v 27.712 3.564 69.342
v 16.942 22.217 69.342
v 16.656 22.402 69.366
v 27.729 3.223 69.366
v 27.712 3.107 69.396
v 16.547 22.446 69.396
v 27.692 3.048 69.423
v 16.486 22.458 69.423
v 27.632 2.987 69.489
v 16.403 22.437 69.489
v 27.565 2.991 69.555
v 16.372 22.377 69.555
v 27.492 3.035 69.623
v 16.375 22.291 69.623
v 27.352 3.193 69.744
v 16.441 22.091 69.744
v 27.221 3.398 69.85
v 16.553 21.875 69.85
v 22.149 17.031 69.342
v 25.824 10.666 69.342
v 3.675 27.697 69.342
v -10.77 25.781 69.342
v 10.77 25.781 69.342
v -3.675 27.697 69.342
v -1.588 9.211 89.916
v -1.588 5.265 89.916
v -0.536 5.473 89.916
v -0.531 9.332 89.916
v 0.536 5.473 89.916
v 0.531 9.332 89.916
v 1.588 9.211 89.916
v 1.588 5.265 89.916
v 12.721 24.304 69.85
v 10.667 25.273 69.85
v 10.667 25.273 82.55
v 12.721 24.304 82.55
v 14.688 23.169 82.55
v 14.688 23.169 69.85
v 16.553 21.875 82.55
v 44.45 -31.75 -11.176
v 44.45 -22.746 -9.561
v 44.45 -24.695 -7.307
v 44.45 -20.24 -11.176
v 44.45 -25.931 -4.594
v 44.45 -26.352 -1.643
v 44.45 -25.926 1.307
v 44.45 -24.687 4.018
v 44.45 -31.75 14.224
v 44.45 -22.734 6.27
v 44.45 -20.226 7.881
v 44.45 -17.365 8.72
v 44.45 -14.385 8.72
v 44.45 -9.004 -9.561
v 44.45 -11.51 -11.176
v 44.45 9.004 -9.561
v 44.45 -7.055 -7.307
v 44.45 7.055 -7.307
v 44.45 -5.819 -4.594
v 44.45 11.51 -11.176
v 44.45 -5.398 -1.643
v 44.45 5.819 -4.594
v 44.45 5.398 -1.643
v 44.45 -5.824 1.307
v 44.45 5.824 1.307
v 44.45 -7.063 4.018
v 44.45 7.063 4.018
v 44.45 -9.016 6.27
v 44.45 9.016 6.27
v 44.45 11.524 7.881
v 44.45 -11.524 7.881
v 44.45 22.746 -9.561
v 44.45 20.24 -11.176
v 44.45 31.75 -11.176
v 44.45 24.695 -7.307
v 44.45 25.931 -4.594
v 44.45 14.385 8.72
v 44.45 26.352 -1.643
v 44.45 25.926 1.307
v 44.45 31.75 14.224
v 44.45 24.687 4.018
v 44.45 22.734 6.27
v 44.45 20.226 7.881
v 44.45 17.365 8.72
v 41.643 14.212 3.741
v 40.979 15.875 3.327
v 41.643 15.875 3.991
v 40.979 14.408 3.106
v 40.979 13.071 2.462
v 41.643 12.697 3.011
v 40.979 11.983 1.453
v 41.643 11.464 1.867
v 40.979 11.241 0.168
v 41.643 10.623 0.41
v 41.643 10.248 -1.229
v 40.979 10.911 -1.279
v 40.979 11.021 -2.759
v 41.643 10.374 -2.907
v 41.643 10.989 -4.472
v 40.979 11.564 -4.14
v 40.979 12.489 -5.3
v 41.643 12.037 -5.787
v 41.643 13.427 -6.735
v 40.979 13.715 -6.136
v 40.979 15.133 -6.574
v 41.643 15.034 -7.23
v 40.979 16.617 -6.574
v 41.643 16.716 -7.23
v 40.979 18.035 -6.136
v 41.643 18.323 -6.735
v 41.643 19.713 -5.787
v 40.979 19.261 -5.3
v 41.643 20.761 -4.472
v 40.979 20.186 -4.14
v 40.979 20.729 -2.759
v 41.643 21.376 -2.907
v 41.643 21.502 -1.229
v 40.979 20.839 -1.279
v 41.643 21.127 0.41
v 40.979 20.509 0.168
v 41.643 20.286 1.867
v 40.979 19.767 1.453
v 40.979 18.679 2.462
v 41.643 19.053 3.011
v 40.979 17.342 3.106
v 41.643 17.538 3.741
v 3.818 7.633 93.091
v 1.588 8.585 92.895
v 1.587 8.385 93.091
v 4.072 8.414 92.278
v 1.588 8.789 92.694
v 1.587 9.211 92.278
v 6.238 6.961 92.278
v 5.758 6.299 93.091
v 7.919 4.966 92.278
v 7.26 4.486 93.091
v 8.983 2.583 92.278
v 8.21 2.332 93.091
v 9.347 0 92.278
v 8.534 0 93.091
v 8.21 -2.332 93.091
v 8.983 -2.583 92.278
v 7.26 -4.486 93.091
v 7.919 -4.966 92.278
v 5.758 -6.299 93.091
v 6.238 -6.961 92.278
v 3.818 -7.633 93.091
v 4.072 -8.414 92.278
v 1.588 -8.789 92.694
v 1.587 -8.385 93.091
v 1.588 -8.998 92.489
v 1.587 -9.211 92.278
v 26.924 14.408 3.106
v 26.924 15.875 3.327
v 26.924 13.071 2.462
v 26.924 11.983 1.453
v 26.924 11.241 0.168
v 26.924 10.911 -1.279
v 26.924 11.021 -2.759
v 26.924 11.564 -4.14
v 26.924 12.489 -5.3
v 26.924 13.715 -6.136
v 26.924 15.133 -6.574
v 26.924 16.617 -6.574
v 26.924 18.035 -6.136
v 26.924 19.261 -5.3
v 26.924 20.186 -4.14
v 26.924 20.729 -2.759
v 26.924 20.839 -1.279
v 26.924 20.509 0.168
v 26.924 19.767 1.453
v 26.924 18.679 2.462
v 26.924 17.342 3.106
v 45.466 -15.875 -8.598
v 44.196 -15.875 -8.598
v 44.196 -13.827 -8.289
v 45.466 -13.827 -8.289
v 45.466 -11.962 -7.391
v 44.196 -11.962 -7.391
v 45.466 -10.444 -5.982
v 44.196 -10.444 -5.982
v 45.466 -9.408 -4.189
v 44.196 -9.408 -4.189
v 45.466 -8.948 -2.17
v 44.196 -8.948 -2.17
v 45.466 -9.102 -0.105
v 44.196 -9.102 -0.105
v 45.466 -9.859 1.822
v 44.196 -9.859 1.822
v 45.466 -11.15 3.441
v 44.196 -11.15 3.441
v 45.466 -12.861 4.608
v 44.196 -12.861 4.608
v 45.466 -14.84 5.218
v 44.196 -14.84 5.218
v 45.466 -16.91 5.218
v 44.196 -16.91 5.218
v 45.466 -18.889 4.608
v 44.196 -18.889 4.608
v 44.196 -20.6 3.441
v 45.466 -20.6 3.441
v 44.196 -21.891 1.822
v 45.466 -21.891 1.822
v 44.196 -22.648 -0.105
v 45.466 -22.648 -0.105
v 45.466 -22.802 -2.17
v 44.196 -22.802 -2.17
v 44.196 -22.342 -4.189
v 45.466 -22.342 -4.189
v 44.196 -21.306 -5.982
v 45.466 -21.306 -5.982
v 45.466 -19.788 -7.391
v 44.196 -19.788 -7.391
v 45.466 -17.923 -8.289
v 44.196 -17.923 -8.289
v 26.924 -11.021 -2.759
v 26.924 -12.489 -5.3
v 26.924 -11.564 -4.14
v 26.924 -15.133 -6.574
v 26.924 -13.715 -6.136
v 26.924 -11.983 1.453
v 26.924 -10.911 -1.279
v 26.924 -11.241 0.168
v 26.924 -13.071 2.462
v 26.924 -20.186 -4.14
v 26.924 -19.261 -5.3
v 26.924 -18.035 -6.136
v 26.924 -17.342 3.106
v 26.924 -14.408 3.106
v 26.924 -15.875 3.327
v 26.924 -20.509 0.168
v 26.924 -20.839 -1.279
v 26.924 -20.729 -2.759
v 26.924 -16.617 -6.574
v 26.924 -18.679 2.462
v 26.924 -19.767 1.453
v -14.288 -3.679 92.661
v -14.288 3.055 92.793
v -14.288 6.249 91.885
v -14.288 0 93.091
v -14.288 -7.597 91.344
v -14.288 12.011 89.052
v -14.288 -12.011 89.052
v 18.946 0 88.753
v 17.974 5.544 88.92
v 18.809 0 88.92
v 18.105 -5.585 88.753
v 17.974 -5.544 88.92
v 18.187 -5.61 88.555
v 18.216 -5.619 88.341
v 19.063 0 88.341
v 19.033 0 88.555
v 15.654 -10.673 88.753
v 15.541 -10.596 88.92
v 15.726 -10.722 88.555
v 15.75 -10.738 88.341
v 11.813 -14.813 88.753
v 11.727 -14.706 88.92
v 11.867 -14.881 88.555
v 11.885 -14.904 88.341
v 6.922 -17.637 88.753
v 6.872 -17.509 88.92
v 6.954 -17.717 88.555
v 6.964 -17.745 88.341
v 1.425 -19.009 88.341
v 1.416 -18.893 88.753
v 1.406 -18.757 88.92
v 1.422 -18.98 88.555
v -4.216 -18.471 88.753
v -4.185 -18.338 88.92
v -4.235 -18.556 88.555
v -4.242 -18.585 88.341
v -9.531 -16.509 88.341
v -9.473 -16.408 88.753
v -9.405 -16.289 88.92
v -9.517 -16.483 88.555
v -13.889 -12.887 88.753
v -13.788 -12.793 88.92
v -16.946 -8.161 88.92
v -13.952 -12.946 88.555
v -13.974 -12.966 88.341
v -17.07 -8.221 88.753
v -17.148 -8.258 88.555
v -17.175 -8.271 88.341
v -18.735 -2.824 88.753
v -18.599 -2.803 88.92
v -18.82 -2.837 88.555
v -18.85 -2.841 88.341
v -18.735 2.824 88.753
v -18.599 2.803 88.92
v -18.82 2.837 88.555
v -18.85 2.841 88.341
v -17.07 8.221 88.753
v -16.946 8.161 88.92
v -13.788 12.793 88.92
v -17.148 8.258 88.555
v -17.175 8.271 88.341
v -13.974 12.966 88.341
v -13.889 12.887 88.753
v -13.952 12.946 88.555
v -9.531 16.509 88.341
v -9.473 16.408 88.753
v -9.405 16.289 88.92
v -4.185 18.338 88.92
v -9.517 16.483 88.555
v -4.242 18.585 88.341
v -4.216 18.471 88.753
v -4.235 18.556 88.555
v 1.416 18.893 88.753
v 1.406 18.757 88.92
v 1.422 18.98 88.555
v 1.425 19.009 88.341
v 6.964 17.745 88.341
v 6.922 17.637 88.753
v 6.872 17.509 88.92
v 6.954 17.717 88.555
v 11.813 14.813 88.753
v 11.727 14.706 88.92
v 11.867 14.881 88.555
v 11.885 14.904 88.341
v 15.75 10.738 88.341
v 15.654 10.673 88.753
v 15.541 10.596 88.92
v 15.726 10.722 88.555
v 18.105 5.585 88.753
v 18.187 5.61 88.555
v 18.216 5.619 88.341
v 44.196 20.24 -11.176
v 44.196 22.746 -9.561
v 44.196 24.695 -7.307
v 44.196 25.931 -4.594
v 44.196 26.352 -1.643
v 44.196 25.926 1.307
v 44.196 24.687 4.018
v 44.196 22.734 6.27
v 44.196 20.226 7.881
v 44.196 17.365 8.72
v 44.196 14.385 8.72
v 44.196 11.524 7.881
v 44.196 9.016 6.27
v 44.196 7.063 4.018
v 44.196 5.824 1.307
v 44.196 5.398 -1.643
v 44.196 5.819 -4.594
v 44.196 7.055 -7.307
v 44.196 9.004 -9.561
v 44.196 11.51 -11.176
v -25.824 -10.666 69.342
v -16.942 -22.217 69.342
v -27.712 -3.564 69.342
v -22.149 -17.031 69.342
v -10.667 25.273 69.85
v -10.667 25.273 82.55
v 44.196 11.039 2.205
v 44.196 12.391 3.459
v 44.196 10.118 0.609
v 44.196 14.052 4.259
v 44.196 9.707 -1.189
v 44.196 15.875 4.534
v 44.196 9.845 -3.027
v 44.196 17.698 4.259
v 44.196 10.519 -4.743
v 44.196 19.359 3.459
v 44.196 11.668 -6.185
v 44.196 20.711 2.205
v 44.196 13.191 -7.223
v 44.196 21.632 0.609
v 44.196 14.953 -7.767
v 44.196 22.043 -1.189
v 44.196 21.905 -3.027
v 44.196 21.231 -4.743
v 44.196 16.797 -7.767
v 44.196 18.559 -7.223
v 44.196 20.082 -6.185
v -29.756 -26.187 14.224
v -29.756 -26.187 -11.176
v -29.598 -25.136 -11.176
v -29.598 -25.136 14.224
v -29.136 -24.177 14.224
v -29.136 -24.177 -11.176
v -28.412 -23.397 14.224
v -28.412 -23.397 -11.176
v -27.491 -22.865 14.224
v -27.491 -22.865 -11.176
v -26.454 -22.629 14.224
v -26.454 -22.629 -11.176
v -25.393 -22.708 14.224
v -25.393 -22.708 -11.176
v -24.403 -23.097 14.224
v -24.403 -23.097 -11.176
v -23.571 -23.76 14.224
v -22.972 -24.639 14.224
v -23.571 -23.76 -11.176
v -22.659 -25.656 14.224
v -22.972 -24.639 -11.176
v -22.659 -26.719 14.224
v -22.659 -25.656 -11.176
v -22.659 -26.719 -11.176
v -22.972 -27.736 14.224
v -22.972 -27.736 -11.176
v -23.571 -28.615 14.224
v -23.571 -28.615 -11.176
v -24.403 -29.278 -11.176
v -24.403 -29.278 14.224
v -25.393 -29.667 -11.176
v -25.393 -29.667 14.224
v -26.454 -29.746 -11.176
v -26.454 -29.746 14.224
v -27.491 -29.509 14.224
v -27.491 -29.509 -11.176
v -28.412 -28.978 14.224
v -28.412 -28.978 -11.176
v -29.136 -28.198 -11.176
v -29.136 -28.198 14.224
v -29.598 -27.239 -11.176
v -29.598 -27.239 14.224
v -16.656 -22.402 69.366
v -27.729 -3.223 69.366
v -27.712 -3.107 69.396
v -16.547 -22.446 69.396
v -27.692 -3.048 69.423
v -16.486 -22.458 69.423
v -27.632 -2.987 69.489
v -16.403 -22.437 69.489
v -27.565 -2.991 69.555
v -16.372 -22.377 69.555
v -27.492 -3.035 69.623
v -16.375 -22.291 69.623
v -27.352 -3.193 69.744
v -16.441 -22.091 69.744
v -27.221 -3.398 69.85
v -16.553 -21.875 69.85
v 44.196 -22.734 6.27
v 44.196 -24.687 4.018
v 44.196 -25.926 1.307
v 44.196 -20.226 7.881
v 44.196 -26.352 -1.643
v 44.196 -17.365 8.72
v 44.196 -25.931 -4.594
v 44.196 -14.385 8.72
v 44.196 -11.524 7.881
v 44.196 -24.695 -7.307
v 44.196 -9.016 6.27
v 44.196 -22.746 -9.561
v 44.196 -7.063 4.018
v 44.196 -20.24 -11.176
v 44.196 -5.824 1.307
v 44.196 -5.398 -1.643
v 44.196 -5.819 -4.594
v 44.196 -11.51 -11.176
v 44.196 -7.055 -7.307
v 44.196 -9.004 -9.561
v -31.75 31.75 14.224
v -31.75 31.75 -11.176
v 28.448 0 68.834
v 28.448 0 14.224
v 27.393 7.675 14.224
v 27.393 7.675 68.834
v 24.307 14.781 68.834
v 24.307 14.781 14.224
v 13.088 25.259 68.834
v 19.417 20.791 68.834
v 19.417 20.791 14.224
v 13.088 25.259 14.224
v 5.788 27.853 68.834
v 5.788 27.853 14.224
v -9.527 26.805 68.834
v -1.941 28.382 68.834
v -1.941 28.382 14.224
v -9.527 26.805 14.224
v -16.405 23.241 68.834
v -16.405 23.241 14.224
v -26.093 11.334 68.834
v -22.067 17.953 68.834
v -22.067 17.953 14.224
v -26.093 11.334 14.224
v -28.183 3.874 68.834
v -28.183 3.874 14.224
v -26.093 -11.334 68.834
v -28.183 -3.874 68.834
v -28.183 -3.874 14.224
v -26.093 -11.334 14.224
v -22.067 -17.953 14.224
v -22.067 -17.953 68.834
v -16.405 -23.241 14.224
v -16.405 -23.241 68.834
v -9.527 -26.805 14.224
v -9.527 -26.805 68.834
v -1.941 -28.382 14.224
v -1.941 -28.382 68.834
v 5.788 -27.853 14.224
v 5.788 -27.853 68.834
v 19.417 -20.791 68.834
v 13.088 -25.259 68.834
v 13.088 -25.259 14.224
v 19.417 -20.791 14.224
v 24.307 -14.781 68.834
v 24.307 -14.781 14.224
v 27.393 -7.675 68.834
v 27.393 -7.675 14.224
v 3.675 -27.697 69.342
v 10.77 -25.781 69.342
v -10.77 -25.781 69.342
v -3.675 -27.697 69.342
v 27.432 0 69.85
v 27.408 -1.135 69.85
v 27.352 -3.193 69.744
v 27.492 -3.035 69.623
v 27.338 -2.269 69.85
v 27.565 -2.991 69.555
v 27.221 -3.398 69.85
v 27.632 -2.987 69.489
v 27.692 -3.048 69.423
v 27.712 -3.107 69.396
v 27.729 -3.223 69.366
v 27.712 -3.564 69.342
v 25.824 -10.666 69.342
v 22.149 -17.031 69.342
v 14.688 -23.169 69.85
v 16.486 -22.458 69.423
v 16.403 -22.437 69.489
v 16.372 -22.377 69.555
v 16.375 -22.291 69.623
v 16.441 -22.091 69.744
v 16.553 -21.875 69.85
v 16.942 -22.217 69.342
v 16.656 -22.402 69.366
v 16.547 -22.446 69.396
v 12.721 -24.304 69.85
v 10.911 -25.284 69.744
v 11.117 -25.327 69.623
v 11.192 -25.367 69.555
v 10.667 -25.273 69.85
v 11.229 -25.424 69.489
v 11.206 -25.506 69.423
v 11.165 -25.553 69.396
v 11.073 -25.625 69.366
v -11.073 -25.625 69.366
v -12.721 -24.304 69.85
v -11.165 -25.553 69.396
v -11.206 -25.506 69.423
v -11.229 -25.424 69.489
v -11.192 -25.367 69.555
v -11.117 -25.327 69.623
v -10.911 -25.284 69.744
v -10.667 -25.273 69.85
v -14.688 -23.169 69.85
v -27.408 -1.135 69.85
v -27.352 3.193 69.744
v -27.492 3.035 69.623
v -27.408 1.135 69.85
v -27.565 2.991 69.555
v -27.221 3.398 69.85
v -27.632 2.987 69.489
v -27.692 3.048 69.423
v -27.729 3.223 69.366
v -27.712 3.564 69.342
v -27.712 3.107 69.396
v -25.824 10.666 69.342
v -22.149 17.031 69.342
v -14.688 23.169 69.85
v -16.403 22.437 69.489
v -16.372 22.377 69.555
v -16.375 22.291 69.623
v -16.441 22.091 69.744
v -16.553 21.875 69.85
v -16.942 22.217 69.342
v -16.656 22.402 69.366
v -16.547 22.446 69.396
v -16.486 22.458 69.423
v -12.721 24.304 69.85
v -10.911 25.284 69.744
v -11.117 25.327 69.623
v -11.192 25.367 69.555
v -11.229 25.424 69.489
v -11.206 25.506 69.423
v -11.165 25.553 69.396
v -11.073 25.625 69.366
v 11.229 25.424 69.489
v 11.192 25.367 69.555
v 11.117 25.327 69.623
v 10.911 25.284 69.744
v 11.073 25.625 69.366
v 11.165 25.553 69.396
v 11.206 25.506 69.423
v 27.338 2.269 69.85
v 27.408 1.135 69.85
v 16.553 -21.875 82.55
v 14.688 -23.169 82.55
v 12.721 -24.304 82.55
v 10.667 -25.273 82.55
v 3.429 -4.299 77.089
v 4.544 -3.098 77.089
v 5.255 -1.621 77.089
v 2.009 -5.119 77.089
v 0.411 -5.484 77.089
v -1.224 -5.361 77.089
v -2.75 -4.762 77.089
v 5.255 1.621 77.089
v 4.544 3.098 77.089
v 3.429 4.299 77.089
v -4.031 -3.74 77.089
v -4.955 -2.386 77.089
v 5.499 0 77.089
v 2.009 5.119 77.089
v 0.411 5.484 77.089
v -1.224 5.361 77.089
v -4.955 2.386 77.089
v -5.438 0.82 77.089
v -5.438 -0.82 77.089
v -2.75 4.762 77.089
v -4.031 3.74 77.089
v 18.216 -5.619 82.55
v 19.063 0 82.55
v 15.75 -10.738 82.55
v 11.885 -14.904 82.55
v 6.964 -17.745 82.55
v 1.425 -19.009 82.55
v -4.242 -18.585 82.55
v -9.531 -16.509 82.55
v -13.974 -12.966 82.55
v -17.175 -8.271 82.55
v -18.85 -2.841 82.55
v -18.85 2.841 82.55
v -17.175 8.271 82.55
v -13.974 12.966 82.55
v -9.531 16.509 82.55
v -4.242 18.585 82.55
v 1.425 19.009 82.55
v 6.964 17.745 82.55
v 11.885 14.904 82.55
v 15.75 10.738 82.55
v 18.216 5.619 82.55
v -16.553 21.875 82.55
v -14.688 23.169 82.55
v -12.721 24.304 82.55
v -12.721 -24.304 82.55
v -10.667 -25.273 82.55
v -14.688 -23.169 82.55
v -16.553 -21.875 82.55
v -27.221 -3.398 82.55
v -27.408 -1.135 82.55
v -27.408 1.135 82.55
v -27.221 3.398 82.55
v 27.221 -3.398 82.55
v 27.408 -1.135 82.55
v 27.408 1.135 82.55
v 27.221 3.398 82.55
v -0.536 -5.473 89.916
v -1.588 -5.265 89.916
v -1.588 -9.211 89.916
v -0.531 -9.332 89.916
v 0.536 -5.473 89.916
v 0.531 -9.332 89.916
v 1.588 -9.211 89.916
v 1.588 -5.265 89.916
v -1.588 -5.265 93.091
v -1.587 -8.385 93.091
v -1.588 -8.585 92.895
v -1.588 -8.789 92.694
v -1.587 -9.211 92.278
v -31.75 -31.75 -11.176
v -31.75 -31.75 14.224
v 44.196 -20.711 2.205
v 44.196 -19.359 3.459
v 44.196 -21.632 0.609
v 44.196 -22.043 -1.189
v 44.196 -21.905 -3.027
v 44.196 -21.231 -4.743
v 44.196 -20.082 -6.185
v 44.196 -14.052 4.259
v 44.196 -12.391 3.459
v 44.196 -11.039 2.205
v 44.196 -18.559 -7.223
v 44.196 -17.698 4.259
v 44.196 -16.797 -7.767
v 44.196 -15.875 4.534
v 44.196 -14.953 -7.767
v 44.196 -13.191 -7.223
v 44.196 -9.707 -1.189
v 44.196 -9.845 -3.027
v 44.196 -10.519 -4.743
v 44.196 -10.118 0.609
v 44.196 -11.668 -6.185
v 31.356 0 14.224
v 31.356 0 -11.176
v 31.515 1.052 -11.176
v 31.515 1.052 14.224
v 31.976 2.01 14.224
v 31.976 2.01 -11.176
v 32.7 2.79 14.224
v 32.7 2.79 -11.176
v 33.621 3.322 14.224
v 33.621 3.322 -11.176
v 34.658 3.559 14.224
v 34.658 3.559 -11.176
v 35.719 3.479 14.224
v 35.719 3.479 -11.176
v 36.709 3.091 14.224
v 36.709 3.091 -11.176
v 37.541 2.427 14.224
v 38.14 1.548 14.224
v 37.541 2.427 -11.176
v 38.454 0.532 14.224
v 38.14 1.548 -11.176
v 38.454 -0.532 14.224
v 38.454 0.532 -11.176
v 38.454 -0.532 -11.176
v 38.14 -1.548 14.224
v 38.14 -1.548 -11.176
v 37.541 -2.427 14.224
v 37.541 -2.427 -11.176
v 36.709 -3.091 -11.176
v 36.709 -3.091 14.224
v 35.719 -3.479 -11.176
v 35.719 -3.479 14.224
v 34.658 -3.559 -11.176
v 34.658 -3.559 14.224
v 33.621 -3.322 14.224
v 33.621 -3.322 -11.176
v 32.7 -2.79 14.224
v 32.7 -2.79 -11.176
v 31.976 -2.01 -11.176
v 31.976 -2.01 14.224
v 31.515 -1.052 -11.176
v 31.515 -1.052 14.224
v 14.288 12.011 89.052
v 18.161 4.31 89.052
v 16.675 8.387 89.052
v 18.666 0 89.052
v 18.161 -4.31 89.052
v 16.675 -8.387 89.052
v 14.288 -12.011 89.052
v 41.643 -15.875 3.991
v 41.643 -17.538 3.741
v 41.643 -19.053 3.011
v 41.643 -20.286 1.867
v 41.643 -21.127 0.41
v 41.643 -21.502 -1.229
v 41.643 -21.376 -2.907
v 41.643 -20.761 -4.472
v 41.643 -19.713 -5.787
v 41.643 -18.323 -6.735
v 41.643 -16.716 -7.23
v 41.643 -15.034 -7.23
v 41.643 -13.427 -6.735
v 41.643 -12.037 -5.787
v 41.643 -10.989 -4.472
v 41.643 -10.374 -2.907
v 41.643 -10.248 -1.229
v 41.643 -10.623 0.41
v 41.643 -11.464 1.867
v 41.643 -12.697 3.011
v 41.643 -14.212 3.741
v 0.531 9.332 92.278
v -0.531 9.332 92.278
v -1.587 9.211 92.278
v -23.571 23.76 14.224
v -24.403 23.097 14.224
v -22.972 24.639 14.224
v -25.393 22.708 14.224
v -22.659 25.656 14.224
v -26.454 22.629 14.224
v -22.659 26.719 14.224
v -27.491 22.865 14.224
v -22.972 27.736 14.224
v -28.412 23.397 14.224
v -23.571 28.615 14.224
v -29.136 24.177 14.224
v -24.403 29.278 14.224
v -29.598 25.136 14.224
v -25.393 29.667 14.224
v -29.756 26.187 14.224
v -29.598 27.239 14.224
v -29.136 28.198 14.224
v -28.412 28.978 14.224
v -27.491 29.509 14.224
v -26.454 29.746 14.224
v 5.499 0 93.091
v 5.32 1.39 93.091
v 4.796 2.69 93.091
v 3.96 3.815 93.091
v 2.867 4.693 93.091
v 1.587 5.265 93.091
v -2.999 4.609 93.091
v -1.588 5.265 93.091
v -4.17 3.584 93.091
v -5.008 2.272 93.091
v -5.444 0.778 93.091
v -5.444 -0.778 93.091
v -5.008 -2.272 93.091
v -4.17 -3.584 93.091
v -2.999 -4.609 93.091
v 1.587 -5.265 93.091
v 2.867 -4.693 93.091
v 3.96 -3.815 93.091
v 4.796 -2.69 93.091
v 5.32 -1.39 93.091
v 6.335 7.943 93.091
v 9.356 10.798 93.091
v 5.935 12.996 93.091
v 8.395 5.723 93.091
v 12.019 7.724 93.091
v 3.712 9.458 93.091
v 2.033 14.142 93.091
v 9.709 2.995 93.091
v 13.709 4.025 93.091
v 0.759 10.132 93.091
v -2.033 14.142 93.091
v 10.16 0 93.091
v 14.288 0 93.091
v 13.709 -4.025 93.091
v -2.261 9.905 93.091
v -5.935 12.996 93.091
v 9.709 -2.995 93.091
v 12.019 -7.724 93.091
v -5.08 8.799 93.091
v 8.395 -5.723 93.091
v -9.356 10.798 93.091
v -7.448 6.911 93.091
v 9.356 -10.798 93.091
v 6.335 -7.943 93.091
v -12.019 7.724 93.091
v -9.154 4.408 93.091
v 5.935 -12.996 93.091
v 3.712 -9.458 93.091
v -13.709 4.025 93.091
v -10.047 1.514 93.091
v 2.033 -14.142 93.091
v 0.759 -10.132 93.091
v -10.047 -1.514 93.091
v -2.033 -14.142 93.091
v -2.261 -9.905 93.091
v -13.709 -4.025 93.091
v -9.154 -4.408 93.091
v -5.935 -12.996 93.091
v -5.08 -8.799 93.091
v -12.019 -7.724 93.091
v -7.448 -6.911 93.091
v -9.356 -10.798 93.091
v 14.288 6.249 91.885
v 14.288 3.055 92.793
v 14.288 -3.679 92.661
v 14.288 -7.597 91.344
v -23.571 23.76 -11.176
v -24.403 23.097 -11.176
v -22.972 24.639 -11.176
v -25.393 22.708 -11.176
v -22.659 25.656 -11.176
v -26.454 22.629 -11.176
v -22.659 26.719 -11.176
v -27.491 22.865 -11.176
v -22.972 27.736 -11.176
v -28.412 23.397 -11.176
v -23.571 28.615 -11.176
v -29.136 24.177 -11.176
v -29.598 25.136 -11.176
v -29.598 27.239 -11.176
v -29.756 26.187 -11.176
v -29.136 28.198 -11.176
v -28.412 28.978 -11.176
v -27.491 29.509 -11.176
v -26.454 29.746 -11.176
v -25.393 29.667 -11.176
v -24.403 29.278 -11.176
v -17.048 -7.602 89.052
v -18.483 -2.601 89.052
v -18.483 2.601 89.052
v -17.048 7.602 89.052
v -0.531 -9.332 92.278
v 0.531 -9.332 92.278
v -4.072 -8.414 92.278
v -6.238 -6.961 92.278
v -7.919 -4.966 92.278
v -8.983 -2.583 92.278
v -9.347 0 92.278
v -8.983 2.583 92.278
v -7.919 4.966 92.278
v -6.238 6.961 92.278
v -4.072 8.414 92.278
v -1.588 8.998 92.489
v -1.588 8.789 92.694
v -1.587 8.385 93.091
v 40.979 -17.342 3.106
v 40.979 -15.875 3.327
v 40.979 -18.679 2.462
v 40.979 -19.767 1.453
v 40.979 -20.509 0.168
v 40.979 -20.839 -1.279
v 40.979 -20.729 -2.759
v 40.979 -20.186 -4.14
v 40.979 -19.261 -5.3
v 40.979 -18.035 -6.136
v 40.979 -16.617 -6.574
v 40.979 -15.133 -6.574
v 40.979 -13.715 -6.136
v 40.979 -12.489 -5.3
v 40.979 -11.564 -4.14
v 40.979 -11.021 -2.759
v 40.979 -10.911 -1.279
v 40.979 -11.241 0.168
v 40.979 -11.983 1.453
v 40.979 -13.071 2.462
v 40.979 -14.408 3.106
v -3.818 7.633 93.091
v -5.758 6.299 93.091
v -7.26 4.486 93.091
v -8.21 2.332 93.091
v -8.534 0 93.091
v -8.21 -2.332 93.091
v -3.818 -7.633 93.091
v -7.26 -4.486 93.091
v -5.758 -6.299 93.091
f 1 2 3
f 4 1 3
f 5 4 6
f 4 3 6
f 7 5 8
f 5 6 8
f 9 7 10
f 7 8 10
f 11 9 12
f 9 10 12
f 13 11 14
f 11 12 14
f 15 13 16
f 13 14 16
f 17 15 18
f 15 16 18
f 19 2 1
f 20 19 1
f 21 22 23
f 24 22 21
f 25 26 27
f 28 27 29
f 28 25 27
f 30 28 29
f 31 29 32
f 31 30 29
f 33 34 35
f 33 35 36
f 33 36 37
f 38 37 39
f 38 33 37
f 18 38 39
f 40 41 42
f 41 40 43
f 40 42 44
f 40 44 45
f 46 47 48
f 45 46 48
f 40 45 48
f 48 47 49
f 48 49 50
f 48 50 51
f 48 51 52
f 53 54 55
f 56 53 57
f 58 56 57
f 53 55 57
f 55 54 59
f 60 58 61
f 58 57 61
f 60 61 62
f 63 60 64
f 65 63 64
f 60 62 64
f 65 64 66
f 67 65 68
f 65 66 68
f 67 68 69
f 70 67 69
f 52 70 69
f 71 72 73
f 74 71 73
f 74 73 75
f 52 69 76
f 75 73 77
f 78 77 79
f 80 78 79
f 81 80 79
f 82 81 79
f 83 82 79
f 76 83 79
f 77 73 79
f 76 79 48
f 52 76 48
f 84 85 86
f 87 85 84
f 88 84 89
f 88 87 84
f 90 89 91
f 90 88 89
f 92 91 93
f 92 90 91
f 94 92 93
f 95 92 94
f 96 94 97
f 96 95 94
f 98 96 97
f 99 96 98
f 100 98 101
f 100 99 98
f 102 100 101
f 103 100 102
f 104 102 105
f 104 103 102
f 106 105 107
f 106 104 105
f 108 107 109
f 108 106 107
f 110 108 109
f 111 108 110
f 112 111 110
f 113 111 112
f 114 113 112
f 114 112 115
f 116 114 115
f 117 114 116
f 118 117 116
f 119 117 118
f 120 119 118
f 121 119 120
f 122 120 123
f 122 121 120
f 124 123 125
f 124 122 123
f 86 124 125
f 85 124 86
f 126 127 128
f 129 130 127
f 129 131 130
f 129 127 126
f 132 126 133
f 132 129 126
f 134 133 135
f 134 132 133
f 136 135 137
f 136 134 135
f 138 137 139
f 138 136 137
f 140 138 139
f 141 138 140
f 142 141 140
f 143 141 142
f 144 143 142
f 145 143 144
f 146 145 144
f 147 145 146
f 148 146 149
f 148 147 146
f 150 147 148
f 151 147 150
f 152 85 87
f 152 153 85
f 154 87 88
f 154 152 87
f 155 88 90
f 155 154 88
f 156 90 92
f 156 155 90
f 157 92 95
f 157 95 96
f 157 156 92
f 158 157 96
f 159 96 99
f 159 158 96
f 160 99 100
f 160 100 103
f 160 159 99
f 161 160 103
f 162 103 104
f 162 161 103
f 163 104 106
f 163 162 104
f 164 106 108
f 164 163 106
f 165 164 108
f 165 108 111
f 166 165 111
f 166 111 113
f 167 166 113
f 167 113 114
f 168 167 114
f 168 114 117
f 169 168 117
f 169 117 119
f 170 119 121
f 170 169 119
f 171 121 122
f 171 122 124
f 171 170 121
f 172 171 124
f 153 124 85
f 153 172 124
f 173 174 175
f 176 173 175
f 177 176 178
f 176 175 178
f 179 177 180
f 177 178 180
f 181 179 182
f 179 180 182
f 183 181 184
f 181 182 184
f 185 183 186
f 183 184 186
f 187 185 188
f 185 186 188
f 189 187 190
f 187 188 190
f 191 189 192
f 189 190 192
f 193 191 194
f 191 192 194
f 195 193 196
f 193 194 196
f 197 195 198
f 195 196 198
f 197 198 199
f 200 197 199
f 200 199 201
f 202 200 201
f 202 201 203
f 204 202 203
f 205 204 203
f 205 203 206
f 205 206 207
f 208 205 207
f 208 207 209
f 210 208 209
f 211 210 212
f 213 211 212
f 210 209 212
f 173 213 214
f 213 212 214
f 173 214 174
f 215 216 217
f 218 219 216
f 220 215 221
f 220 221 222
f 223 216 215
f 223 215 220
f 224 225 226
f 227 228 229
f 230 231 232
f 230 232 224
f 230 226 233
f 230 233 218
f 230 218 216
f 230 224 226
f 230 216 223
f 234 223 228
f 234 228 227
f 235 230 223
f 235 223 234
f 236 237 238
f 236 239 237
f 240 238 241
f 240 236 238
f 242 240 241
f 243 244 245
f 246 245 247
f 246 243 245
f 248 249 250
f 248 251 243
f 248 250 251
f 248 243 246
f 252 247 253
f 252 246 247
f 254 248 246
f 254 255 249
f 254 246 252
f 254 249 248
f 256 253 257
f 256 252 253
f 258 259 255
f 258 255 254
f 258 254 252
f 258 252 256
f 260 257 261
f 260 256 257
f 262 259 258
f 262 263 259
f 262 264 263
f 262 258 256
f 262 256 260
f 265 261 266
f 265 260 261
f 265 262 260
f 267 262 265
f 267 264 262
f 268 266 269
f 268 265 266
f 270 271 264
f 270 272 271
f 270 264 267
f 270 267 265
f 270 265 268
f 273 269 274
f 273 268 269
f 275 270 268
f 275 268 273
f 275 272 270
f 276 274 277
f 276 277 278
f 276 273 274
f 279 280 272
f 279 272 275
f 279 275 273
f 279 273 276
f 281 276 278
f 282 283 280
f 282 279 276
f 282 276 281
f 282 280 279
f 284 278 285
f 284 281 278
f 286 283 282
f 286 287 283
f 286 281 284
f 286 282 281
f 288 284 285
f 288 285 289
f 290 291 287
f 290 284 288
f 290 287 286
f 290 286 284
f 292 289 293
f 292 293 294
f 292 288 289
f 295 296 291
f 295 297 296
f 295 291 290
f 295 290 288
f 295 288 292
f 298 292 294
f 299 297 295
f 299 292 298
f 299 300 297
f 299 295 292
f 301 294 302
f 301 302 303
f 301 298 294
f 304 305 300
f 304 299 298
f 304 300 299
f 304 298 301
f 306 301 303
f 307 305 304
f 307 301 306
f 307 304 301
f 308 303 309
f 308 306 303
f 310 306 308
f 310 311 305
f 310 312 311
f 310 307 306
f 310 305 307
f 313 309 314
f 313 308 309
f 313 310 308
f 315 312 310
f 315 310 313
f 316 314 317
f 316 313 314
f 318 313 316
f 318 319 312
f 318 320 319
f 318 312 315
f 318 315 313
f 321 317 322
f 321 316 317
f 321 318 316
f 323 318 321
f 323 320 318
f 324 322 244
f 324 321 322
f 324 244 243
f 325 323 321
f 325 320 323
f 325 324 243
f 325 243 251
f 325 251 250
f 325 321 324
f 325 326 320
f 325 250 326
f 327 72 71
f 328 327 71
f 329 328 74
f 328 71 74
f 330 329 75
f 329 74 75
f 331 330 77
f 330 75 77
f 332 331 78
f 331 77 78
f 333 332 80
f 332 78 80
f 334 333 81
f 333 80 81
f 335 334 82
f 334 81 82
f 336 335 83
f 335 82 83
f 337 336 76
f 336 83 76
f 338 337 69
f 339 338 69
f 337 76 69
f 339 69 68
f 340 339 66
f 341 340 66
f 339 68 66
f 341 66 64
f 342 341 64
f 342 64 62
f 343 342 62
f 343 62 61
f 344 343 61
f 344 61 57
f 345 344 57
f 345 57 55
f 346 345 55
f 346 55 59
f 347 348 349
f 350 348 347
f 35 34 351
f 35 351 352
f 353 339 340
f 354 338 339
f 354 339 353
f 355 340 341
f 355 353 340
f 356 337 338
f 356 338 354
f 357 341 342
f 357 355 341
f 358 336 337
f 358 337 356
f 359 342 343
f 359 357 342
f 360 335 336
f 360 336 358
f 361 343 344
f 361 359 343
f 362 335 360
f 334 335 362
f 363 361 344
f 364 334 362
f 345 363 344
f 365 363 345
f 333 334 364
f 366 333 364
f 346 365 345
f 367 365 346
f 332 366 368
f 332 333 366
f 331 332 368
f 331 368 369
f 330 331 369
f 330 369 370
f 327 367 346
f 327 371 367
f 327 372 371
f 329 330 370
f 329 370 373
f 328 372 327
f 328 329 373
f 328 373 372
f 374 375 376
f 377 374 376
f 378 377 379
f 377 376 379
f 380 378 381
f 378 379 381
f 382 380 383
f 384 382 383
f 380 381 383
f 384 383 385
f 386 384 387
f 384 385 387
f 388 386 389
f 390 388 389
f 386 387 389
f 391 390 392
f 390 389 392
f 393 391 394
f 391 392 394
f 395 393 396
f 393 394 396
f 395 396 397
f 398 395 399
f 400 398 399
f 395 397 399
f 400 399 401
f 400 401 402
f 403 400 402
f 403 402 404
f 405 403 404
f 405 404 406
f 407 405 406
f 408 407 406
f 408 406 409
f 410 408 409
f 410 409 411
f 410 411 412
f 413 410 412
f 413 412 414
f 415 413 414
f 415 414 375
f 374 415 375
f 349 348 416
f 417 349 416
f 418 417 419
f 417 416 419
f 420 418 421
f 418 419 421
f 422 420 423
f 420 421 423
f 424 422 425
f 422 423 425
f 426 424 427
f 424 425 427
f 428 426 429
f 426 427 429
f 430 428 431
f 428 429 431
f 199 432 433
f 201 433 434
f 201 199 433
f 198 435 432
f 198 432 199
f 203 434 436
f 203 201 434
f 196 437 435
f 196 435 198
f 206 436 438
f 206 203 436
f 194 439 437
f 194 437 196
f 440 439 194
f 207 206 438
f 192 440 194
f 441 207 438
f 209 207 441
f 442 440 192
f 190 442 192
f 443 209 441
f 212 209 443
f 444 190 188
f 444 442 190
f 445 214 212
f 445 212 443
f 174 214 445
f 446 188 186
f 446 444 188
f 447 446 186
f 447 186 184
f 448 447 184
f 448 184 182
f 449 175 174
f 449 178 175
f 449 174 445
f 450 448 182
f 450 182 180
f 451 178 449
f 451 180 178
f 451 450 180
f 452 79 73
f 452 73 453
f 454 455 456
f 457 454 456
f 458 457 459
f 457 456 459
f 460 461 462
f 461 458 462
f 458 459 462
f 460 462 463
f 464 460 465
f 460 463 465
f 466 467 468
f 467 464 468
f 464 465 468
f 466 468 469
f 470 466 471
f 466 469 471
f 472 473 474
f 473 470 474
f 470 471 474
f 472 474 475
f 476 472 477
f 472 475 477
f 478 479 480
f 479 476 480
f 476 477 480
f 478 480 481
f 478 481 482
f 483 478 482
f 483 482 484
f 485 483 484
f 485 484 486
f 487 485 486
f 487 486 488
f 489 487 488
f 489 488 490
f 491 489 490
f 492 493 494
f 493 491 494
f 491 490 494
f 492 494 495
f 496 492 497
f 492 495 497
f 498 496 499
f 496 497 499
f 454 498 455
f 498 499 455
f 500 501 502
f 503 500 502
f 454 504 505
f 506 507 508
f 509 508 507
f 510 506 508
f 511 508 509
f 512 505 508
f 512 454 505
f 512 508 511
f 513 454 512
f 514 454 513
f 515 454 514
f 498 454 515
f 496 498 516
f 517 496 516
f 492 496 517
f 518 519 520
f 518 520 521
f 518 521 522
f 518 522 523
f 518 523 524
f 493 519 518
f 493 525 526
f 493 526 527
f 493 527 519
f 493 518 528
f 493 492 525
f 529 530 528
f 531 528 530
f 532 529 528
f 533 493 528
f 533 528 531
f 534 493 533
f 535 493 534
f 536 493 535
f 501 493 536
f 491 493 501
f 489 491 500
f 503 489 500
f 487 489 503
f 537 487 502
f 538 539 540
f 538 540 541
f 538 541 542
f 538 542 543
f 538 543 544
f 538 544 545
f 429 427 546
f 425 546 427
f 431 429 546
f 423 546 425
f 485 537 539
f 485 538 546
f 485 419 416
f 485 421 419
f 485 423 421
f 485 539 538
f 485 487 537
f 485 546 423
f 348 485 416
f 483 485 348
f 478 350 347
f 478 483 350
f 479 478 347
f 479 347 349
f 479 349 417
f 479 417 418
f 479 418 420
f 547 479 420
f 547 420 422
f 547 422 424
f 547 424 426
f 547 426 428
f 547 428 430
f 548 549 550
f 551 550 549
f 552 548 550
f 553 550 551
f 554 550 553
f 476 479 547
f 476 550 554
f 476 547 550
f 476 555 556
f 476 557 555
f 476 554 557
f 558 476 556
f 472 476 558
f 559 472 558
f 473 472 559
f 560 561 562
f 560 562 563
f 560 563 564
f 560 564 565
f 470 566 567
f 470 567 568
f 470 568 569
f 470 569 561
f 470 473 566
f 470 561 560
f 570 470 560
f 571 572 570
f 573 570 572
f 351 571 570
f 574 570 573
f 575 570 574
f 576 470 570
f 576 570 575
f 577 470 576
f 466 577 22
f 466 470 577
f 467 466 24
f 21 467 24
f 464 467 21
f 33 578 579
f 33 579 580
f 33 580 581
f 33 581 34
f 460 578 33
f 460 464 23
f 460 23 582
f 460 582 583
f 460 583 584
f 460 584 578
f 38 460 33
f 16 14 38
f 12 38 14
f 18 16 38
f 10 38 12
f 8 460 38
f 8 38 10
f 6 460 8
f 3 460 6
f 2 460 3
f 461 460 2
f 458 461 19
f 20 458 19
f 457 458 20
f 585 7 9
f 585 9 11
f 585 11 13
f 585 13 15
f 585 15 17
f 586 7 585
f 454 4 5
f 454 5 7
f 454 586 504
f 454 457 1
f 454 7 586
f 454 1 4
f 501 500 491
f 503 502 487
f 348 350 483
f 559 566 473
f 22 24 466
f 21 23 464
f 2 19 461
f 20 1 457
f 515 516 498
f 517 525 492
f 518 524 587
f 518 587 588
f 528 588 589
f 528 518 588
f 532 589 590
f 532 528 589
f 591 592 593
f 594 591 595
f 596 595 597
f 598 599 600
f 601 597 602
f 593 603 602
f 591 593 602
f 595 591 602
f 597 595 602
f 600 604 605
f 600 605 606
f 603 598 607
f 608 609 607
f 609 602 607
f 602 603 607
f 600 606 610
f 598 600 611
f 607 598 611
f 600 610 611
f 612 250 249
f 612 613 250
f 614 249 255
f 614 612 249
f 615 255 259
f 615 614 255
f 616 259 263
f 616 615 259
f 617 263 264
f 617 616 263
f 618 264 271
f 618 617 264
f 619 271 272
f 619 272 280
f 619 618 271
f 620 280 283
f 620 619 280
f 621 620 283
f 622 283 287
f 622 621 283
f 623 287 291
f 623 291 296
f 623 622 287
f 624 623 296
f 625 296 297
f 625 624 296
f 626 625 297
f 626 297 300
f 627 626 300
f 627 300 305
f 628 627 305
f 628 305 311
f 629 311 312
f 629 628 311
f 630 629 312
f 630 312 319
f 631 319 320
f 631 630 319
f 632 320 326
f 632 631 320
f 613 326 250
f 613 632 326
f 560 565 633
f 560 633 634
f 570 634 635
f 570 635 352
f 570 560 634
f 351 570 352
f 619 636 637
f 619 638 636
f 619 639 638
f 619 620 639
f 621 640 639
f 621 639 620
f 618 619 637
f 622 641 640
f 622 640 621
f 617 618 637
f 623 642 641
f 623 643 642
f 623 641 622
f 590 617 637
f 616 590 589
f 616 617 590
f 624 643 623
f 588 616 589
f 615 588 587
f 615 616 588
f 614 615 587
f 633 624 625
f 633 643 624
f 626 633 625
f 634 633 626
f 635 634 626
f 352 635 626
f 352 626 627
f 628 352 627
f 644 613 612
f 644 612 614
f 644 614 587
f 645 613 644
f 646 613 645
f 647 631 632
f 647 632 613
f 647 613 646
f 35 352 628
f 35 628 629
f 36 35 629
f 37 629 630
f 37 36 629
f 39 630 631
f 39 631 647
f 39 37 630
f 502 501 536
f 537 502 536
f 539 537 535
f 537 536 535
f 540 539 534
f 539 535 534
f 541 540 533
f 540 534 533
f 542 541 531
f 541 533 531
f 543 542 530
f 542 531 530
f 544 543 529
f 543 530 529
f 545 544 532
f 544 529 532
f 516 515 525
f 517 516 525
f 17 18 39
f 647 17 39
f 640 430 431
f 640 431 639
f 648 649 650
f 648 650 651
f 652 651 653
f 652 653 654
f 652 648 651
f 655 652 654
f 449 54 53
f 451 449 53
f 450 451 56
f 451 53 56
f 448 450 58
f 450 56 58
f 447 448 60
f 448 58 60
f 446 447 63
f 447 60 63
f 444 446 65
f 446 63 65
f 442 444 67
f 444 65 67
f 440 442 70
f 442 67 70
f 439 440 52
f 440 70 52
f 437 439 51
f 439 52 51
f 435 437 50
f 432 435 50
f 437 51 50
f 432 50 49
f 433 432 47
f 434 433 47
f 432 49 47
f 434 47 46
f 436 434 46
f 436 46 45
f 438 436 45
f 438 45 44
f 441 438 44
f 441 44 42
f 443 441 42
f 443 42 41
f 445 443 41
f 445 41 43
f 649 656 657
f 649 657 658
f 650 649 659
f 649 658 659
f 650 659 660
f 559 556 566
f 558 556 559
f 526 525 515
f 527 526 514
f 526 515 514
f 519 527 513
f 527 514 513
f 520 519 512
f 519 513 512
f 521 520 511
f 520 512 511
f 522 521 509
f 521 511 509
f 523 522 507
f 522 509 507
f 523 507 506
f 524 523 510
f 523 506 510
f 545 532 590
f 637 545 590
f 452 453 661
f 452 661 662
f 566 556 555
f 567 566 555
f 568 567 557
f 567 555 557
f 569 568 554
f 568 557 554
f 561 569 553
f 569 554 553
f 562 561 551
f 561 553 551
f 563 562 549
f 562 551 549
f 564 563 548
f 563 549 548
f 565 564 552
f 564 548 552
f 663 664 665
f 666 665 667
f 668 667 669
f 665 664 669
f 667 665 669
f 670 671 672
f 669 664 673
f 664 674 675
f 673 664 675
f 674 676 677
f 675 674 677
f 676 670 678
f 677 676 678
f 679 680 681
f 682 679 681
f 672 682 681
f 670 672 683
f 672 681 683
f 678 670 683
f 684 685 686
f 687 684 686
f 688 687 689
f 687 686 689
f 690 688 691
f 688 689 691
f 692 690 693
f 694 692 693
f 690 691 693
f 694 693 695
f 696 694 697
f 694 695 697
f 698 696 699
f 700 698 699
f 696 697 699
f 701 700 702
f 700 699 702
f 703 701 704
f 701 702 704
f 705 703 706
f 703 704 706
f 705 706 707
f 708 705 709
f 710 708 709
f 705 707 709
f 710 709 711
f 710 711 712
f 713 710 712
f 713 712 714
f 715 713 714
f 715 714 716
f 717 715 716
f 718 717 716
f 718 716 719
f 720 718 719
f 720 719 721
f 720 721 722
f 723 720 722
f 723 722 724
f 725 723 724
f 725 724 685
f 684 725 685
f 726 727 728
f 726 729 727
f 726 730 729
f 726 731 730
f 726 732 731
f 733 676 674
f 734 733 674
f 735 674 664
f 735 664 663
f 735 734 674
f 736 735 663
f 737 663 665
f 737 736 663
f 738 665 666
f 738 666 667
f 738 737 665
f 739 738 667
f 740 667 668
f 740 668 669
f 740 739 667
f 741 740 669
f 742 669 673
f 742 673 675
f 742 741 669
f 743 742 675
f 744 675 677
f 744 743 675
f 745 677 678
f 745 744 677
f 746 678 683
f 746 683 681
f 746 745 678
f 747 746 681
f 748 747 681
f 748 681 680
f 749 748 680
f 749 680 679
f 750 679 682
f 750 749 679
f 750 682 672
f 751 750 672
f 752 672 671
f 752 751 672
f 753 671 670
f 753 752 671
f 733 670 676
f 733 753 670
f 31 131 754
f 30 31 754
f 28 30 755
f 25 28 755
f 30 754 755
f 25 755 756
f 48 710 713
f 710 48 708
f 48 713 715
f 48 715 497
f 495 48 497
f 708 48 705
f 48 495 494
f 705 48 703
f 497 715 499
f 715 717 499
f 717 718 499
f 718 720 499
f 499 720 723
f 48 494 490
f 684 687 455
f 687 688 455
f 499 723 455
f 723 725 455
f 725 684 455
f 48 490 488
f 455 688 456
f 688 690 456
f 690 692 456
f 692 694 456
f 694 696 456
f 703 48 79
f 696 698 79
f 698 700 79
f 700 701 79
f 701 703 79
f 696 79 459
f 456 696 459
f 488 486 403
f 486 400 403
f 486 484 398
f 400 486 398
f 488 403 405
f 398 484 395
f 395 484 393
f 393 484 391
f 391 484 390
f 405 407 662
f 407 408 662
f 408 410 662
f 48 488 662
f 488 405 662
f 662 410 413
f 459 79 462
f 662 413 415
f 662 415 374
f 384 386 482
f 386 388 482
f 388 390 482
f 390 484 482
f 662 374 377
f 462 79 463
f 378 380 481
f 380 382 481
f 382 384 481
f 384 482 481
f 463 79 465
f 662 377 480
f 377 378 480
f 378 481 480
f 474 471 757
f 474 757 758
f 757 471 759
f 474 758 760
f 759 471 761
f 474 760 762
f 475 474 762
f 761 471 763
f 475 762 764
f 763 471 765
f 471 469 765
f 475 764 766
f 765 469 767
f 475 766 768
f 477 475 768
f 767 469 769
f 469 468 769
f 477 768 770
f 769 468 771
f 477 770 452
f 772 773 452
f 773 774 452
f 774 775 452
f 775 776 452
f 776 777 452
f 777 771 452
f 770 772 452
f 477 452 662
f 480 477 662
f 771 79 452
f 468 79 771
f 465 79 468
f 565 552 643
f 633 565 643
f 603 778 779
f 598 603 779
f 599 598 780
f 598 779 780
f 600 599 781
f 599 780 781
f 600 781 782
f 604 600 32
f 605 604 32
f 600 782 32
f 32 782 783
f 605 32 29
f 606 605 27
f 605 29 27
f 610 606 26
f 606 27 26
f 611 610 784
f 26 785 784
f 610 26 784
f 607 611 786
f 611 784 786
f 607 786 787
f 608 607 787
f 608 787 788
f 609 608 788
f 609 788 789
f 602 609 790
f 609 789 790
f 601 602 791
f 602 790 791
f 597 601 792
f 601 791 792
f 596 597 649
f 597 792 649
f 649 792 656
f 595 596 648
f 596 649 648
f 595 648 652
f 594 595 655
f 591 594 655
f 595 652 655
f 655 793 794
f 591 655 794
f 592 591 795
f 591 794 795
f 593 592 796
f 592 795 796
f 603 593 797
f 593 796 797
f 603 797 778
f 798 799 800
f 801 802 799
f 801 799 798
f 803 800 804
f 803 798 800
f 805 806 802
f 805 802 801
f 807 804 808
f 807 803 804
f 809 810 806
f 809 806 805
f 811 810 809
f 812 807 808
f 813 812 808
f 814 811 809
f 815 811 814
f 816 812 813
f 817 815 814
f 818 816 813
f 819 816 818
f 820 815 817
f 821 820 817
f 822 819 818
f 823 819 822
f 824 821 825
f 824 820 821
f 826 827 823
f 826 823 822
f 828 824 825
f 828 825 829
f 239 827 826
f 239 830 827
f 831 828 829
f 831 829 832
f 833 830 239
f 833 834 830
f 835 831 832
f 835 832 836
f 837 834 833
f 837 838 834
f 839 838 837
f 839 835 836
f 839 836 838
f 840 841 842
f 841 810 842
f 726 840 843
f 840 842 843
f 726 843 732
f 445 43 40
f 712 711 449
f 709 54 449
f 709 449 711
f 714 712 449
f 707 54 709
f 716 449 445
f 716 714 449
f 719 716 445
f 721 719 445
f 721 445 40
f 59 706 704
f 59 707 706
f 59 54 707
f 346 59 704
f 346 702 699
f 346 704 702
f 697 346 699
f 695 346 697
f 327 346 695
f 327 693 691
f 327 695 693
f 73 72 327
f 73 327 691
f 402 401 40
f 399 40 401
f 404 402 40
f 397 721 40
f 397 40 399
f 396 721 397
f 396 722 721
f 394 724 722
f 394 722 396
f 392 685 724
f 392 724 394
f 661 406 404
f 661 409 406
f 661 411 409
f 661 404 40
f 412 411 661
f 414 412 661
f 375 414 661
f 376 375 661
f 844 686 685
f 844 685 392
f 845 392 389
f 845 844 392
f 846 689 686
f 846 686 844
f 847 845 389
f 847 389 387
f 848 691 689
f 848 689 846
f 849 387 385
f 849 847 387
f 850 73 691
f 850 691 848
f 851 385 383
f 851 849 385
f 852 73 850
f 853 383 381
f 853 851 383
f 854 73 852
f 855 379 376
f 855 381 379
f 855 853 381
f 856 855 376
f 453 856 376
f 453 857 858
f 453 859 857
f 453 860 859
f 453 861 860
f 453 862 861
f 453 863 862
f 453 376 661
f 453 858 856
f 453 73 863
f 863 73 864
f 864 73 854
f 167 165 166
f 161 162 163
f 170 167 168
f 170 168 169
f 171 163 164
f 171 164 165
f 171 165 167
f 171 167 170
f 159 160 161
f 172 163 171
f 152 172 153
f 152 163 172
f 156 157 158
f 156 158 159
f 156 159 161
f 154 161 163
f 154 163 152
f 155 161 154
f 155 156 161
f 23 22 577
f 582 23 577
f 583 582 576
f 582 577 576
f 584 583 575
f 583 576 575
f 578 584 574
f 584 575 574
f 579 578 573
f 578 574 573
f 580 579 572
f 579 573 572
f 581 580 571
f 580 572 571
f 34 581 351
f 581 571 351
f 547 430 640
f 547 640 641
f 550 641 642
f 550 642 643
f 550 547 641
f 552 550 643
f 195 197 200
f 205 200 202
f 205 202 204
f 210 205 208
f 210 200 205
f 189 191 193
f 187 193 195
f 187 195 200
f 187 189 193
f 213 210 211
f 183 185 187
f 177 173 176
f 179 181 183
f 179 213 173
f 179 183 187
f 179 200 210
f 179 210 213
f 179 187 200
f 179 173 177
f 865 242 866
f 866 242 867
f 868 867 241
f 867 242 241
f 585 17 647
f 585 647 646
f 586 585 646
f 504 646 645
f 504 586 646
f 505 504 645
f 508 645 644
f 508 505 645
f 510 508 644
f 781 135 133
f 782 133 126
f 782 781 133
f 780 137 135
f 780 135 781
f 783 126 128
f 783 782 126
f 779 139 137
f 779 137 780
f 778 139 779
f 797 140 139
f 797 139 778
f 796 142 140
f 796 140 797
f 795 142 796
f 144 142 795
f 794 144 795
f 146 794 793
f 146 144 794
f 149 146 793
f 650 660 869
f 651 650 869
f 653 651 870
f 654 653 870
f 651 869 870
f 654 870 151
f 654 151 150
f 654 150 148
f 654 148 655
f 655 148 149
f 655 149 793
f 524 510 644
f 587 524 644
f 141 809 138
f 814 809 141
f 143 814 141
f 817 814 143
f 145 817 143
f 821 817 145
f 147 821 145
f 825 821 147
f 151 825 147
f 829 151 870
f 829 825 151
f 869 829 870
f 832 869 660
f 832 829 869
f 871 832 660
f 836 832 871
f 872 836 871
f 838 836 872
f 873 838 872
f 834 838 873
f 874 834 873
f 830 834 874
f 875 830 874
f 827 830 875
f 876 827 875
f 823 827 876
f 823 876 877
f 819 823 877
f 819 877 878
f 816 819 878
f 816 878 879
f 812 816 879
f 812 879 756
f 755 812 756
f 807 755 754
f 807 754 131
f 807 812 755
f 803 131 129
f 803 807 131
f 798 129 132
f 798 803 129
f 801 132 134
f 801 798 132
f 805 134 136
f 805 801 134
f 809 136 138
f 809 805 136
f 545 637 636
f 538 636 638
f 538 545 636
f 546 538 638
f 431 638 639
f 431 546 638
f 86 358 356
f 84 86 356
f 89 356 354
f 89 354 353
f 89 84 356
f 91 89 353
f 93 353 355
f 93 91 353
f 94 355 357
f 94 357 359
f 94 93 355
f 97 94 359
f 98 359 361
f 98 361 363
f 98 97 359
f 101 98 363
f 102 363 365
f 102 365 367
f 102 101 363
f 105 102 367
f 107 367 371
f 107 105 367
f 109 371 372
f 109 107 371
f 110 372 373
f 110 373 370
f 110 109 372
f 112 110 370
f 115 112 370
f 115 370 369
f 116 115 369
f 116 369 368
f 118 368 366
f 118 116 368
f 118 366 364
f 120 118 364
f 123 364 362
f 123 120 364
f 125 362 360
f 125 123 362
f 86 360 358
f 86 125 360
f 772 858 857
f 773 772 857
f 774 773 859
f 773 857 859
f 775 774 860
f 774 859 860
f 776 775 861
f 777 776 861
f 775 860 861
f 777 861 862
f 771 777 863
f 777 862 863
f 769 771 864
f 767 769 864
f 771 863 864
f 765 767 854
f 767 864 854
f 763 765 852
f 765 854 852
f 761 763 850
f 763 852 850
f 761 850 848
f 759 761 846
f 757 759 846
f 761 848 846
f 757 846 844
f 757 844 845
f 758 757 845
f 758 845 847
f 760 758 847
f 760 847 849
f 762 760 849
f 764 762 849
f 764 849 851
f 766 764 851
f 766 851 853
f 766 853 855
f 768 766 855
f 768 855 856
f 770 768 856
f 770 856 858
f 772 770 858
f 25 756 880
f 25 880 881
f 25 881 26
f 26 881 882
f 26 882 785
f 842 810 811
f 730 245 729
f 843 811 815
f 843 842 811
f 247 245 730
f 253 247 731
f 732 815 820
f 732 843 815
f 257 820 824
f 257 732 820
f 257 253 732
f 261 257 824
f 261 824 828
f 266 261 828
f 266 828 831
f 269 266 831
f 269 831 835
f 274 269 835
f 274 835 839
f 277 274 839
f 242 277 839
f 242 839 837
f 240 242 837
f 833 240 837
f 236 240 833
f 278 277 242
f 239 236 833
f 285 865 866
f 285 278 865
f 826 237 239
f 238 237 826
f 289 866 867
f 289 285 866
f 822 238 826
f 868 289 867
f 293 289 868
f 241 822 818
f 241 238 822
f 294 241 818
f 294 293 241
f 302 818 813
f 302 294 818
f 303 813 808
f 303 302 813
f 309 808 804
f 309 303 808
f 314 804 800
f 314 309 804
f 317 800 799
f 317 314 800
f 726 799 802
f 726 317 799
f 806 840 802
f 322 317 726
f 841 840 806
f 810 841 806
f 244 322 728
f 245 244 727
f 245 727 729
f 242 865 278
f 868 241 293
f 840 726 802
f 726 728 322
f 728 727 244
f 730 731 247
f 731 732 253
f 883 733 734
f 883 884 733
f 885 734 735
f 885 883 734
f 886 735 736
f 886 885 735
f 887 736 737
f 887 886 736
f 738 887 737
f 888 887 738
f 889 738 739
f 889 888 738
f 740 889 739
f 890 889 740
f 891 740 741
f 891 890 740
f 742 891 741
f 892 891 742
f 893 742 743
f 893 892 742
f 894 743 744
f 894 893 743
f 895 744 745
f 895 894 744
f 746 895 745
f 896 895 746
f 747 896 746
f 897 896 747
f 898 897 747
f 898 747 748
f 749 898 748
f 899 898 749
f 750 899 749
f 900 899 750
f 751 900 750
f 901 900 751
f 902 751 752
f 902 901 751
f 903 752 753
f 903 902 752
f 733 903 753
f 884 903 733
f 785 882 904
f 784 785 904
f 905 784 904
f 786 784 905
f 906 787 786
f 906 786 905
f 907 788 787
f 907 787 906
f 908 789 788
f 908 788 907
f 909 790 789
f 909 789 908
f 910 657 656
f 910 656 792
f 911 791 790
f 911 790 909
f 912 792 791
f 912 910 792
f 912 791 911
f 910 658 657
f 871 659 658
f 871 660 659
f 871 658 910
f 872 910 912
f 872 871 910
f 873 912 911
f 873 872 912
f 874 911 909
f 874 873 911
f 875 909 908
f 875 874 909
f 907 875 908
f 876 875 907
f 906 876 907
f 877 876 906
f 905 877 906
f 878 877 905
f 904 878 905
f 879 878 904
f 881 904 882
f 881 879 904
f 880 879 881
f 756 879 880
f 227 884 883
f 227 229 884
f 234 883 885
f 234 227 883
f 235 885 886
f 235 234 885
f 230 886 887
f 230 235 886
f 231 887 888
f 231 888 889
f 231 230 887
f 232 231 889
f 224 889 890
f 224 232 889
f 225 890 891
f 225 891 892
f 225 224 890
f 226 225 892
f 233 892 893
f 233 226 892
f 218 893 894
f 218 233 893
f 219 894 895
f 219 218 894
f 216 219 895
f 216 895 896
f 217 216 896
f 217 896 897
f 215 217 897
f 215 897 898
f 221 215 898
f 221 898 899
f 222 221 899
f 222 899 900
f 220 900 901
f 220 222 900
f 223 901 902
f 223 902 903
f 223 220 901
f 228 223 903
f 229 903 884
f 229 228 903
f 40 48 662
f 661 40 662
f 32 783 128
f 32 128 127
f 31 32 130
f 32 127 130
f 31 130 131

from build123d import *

# Parameters (mm, degrees)
SKETCH1_R           = 28.448
EXTRUDE1_DEPTH      = 82.55
CUT_EXTRUDE1_DEPTH  = 34.1376
SKETCH13_W          = 10.541
SKETCH13_H          = 19.0627
S2D0011_W           = 5.4991
S2D0011_H           = 16.002
SKETCH16_W          = 76.2
SKETCH16_H          = 25.4
EXTRUDE2_DEPTH      = 31.75
EXTRUDE2_DEPTH_BACK = 31.75
SKETCH17_R          = 10.4775
CUT_EXTRUDE9_DEPTH  = 0.254
SKETCH18_R          = 10.4775
CUT_EXTRUDE10_DEPTH = 0.254
SKETCH21_R          = 6.9469
EXTRUDE3_DEPTH      = 1.27
CIRPATTERN2_COUNT   = 6
HOLE1_D             = 7.1374
HOLE1_DEPTH         = 25.4
CUT_EXTRUDE11_DEPTH = 3.175
CUT_EXTRUDE12_DEPTH = 4.0386


with BuildPart() as part:
    # Sketch1 → Extrude1 (new body)
    with BuildSketch(Plane.XY):
        Circle(SKETCH1_R)
    extrude(amount=EXTRUDE1_DEPTH)

    # Sketch2 → Cut-Extrude1 (cut, symmetric)
    with BuildSketch(Plane(origin=(0, 0, 0), x_dir=(0, 0, 1), z_dir=(1, 0, 0))):
        with BuildLine():
            Line((69.342, 28.448), (69.342, 25.781))
            ThreePointArc((69.342, 25.781), (69.490789755, 25.421789755), (69.85, 25.273))
            Line((69.85, 25.273), (82.55, 25.273))
            Line((82.55, 25.273), (82.55, 28.448))
            Line((82.55, 28.448), (69.342, 28.448))
        make_face()
    cut_extrude1 = extrude(amount=CUT_EXTRUDE1_DEPTH, both=True, mode=Mode.SUBTRACT)

    # Sketch10 → Cut-Revolve1 (revolve, cut)
    with BuildSketch(Plane(origin=(0, 0, 0), x_dir=(0, 0, -1), z_dir=(1, 0, 0)), mode=Mode.PRIVATE) as cut_revolve1_sk:
        Polygon((-82.55, 27.432), (-69.85, 27.432), (-68.834, 28.448), (-82.55, 28.448), align=None)
    revolve(cut_revolve1_sk.sketch.rotate(Axis((0, 0, 83.2358), (0, 0, -1)), 90), axis=Axis((0, 0, 83.2358), (0, 0, -1)), mode=Mode.SUBTRACT)  # turned: the seam where the file's is

    # Sketch13 → Revolve1 (revolve)
    with BuildSketch(Plane(origin=(0, 0, 0), x_dir=(0, 0, -1), z_dir=(1, 0, 0)), mode=Mode.PRIVATE) as revolve1_sk:
        with Locations((-87.8205, 9.53135)):
            Rectangle(SKETCH13_W, SKETCH13_H)
    revolve(revolve1_sk.sketch.rotate(Axis((0, 0, 93.61805), (0, 0, -1)), 90), axis=Axis((0, 0, 93.61805), (0, 0, -1)))  # turned: the seam where the file's is

    # S2D0011 → Cut-Revolve4 (revolve, cut)
    with BuildSketch(Plane(origin=(-5.4991, 0, 93.091), x_dir=(-1, 0, 0), z_dir=(0, 1, 0)), mode=Mode.PRIVATE) as cut_revolve4_sk:
        with Locations((-2.74955, -8.001)):
            Rectangle(S2D0011_W, S2D0011_H)
    revolve(cut_revolve4_sk.sketch.rotate(Axis((0, 0, 56.25285781), (0, 0, 1)), 180), axis=Axis((0, 0, 56.25285781), (0, 0, 1)), mode=Mode.SUBTRACT)  # turned: the seam where the file's is

    # Sketch15 → Cut-Revolve5 (revolve, cut)
    with BuildSketch(Plane(origin=(0, 0, 0), x_dir=(0, 0, -1), z_dir=(1, 0, 0)), mode=Mode.PRIVATE) as cut_revolve5_sk:
        with BuildLine():
            Line((-93.091, 14.2875), (-88.919964429, 18.809182473))
            ThreePointArc((-88.919964429, 18.809182473), (-88.65712697, 18.996541229), (-88.3412, 19.0627))
            Line((-88.3412, 19.0627), (-93.091, 19.0627))
            Line((-93.091, 19.0627), (-93.091, 14.2875))
        make_face()
    revolve(cut_revolve5_sk.sketch.rotate(Axis((0, 0, 93.32849), (0, 0, -1)), 90), axis=Axis((0, 0, 93.32849), (0, 0, -1)), mode=Mode.SUBTRACT)  # turned: the seam where the file's is

    # Sketch16 → Extrude2 (add, two sides)
    with BuildSketch(Plane(origin=(0, 0, 0), x_dir=(-1, 0, 0), z_dir=(0, 1, 0))) as extrude2_sk:
        with Locations((-6.35, 1.524)):
            Rectangle(SKETCH16_W, SKETCH16_H)
    extrude(amount=EXTRUDE2_DEPTH)
    extrude(extrude2_sk.sketch, amount=-EXTRUDE2_DEPTH_BACK)

    # Sketch17 → Cut-Extrude9 (cut)
    with BuildSketch(Plane(origin=(44.45, 0, 0), x_dir=(0, 0, -1), z_dir=(1, 0, 0))):
        with Locations((1.651, -15.875)):
            Circle(SKETCH17_R)
    extrude(amount=-CUT_EXTRUDE9_DEPTH, mode=Mode.SUBTRACT)

    # Sketch18 → Cut-Extrude10 (cut)
    with BuildSketch(Plane(origin=(44.45, 0, 0), x_dir=(0, 0, -1), z_dir=(1, 0, 0))):
        with Locations((1.651, 15.875)):
            Circle(SKETCH18_R)
    extrude(amount=-CUT_EXTRUDE10_DEPTH, mode=Mode.SUBTRACT)

    # S2D0002 → Cut-Revolve6 (revolve, cut)
    with BuildSketch(Plane(origin=(44.196, -15.875, -1.651), x_dir=(0, -1, 0), z_dir=(0, 0, 1)), mode=Mode.PRIVATE) as cut_revolve6_sk:
        Polygon((0, 0), (6.1849, 0), (5.642306865, -2.5527), (4.9784, -3.216606865), (4.9784, -17.272), (0, -17.272), align=None)
    revolve(cut_revolve6_sk.sketch.rotate(Axis((26.0604, -15.875, -1.651), (1, 0, 0)), 270), axis=Axis((26.0604, -15.875, -1.651), (1, 0, 0)), mode=Mode.SUBTRACT)  # turned: the seam where the file's is

    # S2D0001 → Cut-Revolve7 (revolve, cut)
    with BuildSketch(Plane(origin=(44.196, 15.875, -1.651), x_dir=(0, -1, 0), z_dir=(0, 0, 1)), mode=Mode.PRIVATE) as cut_revolve7_sk:
        Polygon((0, 0), (6.1849, 0), (5.642306865, -2.5527), (4.9784, -3.216606865), (4.9784, -17.272), (0, -17.272), align=None)
    revolve(cut_revolve7_sk.sketch.rotate(Axis((26.0604, 15.875, -1.651), (1, 0, 0)), 270), axis=Axis((26.0604, 15.875, -1.651), (1, 0, 0)), mode=Mode.SUBTRACT)  # turned: the seam where the file's is

    # Sketch21 → Extrude3 (add)
    with BuildSketch(Plane(origin=(44.196, 0, 0), x_dir=(0, 0, -1), z_dir=(1, 0, 0))):
        with Locations((1.651, -15.875)):
            Circle(SKETCH21_R)
    extrude(amount=EXTRUDE3_DEPTH)

    # CirPattern2: Cut-Extrude1 ×6 about axis
    cirpattern2_axis = Axis((0, 0, 0), (0, 0, 1))
    for i in range(1, CIRPATTERN2_COUNT):
        add(cut_extrude1.rotate(cirpattern2_axis, i * 360 / CIRPATTERN2_COUNT), mode=Mode.SUBTRACT)

    # Hole1
    with Locations(Plane.XY.offset(14.224)):
        with Locations((-26.1874, -26.1874), (34.925, 0), (-26.1874, 26.1874)):
            Hole(HOLE1_D / 2, depth=HOLE1_DEPTH)

    # Sketch24 → Cut-Revolve8 (revolve, cut)
    with BuildSketch(Plane(origin=(0, 0, 0), x_dir=(0, 0, -1), z_dir=(1, 0, 0)), mode=Mode.PRIVATE) as cut_revolve8_sk:
        Polygon((-93.091, 8.5344), (-92.2782, 9.3472), (-93.091, 10.16), align=None)
    revolve(cut_revolve8_sk.sketch.rotate(Axis((0, 0, 93.13164), (0, 0, -1)), 90), axis=Axis((0, 0, 93.13164), (0, 0, -1)), mode=Mode.SUBTRACT)  # turned: the seam where the file's is

    # Sketch25 → Cut-Extrude11 (cut)
    with BuildSketch(Plane.XY.offset(93.091)):
        with BuildLine():
            Line((-1.5875, 9.211405517), (-1.5875, -9.211405517))
            ThreePointArc((-1.5875, -9.211405517), (0, -9.3472), (1.5875, -9.211405517))
            Line((1.5875, -9.211405517), (1.5875, 9.211405517))
            ThreePointArc((1.5875, 9.211405517), (0, 9.3472), (-1.5875, 9.211405517))
        make_face()
    extrude(amount=-CUT_EXTRUDE11_DEPTH, mode=Mode.SUBTRACT)

    # Sketch26 → Cut-Extrude12 (cut)
    with BuildSketch(Plane.XY.offset(93.091)):
        with BuildLine():
            Line((-14.2875, 12.619582998), (-14.2875, -12.619582998))
            ThreePointArc((-14.2875, -12.619582998), (-19.0627, 0), (-14.2875, 12.619582998))
        make_face()
        with BuildLine():
            Line((14.2875, 12.619582998), (14.2875, -12.619582998))
            ThreePointArc((14.2875, -12.619582998), (19.0627, 0), (14.2875, 12.619582998))
        make_face()
    extrude(amount=-CUT_EXTRUDE12_DEPTH, mode=Mode.SUBTRACT)


solid = part.part
